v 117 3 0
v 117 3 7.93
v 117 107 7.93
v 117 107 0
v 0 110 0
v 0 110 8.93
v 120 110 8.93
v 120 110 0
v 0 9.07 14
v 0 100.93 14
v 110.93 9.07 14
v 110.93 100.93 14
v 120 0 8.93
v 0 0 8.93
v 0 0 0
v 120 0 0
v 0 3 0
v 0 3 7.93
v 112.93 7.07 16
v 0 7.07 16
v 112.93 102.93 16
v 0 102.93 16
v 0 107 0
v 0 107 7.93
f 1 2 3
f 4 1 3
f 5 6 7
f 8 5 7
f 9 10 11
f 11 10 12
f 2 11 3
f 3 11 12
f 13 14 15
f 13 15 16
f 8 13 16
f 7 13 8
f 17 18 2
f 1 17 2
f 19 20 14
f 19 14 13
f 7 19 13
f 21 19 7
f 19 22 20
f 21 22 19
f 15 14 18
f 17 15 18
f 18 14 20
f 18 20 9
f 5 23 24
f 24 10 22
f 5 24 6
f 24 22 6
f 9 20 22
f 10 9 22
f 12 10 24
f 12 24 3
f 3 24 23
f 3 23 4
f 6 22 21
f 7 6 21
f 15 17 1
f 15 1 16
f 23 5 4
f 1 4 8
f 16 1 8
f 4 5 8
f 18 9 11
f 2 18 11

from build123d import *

# Parameters (mm, degrees)
BOX035_W               = 117
BOX035_H               = 104
BOX035_DEPTH           = 14
CHAMFER004_SIZE        = 6.07
BOX034_W               = 120
BOX034_H               = 110
BOX034_DEPTH           = 16
CHAMFER003_SIZE        = 7.07
CUT032_PLACEMENT_ANGLE = 180


with BuildPart() as chamfer004:
    # Box035 → Box035 (new body)
    with BuildSketch(Plane(origin=(0, 3, 2), x_dir=(1, 0, 0), z_dir=(0, 0, 1))):
        with Locations((58.5, 52)):
            Rectangle(BOX035_W, BOX035_H)
    extrude(amount=BOX035_DEPTH)

    # Chamfer004
    chamfer004_edges = [chamfer004.edges().sort_by_distance(p)[0] for p in [
        (117, 55, 2),
        (58.5, 3, 2),
        (58.5, 107, 2),
    ]]
    chamfer(chamfer004_edges, length=CHAMFER004_SIZE)


with BuildPart() as deckel_cut_basis:
    # Box034 → Box034 (new body)
    with BuildSketch(Plane.XY):
        with Locations((60, 55)):
            Rectangle(BOX034_W, BOX034_H)
    extrude(amount=BOX034_DEPTH)

    # Chamfer003
    chamfer003_edges = [deckel_cut_basis.edges().sort_by_distance(p)[0] for p in [
        (120, 55, 0),
        (60, 0, 0),
        (60, 110, 0),
    ]]
    chamfer(chamfer003_edges, length=CHAMFER003_SIZE)

    # Cut032: cut Chamfer004
    add(chamfer004.part, mode=Mode.SUBTRACT)


with BuildPart() as deckel_cut_basis_1:
    # Cut032 placement: moved
    add(deckel_cut_basis.part.rotate(Axis((0, 0, 0), (1, 0, 0)), CUT032_PLACEMENT_ANGLE))


with BuildPart() as mirror_of_deckel_cut_konstruktion:
    # mirror: instance of Deckel_Cut_Basis
    add(deckel_cut_basis_1.part.mirror(Plane(origin=(0, 0, 0), x_dir=(1, 0, 0), z_dir=(0, 1, 0))))


with BuildPart() as mirror_of_deckel_cut_konstruktion_1:
    # mirror placement: moved
    add(mirror_of_deckel_cut_konstruktion.part.moved(Location((0, 0, 16))))


solid = mirror_of_deckel_cut_konstruktion_1.part
